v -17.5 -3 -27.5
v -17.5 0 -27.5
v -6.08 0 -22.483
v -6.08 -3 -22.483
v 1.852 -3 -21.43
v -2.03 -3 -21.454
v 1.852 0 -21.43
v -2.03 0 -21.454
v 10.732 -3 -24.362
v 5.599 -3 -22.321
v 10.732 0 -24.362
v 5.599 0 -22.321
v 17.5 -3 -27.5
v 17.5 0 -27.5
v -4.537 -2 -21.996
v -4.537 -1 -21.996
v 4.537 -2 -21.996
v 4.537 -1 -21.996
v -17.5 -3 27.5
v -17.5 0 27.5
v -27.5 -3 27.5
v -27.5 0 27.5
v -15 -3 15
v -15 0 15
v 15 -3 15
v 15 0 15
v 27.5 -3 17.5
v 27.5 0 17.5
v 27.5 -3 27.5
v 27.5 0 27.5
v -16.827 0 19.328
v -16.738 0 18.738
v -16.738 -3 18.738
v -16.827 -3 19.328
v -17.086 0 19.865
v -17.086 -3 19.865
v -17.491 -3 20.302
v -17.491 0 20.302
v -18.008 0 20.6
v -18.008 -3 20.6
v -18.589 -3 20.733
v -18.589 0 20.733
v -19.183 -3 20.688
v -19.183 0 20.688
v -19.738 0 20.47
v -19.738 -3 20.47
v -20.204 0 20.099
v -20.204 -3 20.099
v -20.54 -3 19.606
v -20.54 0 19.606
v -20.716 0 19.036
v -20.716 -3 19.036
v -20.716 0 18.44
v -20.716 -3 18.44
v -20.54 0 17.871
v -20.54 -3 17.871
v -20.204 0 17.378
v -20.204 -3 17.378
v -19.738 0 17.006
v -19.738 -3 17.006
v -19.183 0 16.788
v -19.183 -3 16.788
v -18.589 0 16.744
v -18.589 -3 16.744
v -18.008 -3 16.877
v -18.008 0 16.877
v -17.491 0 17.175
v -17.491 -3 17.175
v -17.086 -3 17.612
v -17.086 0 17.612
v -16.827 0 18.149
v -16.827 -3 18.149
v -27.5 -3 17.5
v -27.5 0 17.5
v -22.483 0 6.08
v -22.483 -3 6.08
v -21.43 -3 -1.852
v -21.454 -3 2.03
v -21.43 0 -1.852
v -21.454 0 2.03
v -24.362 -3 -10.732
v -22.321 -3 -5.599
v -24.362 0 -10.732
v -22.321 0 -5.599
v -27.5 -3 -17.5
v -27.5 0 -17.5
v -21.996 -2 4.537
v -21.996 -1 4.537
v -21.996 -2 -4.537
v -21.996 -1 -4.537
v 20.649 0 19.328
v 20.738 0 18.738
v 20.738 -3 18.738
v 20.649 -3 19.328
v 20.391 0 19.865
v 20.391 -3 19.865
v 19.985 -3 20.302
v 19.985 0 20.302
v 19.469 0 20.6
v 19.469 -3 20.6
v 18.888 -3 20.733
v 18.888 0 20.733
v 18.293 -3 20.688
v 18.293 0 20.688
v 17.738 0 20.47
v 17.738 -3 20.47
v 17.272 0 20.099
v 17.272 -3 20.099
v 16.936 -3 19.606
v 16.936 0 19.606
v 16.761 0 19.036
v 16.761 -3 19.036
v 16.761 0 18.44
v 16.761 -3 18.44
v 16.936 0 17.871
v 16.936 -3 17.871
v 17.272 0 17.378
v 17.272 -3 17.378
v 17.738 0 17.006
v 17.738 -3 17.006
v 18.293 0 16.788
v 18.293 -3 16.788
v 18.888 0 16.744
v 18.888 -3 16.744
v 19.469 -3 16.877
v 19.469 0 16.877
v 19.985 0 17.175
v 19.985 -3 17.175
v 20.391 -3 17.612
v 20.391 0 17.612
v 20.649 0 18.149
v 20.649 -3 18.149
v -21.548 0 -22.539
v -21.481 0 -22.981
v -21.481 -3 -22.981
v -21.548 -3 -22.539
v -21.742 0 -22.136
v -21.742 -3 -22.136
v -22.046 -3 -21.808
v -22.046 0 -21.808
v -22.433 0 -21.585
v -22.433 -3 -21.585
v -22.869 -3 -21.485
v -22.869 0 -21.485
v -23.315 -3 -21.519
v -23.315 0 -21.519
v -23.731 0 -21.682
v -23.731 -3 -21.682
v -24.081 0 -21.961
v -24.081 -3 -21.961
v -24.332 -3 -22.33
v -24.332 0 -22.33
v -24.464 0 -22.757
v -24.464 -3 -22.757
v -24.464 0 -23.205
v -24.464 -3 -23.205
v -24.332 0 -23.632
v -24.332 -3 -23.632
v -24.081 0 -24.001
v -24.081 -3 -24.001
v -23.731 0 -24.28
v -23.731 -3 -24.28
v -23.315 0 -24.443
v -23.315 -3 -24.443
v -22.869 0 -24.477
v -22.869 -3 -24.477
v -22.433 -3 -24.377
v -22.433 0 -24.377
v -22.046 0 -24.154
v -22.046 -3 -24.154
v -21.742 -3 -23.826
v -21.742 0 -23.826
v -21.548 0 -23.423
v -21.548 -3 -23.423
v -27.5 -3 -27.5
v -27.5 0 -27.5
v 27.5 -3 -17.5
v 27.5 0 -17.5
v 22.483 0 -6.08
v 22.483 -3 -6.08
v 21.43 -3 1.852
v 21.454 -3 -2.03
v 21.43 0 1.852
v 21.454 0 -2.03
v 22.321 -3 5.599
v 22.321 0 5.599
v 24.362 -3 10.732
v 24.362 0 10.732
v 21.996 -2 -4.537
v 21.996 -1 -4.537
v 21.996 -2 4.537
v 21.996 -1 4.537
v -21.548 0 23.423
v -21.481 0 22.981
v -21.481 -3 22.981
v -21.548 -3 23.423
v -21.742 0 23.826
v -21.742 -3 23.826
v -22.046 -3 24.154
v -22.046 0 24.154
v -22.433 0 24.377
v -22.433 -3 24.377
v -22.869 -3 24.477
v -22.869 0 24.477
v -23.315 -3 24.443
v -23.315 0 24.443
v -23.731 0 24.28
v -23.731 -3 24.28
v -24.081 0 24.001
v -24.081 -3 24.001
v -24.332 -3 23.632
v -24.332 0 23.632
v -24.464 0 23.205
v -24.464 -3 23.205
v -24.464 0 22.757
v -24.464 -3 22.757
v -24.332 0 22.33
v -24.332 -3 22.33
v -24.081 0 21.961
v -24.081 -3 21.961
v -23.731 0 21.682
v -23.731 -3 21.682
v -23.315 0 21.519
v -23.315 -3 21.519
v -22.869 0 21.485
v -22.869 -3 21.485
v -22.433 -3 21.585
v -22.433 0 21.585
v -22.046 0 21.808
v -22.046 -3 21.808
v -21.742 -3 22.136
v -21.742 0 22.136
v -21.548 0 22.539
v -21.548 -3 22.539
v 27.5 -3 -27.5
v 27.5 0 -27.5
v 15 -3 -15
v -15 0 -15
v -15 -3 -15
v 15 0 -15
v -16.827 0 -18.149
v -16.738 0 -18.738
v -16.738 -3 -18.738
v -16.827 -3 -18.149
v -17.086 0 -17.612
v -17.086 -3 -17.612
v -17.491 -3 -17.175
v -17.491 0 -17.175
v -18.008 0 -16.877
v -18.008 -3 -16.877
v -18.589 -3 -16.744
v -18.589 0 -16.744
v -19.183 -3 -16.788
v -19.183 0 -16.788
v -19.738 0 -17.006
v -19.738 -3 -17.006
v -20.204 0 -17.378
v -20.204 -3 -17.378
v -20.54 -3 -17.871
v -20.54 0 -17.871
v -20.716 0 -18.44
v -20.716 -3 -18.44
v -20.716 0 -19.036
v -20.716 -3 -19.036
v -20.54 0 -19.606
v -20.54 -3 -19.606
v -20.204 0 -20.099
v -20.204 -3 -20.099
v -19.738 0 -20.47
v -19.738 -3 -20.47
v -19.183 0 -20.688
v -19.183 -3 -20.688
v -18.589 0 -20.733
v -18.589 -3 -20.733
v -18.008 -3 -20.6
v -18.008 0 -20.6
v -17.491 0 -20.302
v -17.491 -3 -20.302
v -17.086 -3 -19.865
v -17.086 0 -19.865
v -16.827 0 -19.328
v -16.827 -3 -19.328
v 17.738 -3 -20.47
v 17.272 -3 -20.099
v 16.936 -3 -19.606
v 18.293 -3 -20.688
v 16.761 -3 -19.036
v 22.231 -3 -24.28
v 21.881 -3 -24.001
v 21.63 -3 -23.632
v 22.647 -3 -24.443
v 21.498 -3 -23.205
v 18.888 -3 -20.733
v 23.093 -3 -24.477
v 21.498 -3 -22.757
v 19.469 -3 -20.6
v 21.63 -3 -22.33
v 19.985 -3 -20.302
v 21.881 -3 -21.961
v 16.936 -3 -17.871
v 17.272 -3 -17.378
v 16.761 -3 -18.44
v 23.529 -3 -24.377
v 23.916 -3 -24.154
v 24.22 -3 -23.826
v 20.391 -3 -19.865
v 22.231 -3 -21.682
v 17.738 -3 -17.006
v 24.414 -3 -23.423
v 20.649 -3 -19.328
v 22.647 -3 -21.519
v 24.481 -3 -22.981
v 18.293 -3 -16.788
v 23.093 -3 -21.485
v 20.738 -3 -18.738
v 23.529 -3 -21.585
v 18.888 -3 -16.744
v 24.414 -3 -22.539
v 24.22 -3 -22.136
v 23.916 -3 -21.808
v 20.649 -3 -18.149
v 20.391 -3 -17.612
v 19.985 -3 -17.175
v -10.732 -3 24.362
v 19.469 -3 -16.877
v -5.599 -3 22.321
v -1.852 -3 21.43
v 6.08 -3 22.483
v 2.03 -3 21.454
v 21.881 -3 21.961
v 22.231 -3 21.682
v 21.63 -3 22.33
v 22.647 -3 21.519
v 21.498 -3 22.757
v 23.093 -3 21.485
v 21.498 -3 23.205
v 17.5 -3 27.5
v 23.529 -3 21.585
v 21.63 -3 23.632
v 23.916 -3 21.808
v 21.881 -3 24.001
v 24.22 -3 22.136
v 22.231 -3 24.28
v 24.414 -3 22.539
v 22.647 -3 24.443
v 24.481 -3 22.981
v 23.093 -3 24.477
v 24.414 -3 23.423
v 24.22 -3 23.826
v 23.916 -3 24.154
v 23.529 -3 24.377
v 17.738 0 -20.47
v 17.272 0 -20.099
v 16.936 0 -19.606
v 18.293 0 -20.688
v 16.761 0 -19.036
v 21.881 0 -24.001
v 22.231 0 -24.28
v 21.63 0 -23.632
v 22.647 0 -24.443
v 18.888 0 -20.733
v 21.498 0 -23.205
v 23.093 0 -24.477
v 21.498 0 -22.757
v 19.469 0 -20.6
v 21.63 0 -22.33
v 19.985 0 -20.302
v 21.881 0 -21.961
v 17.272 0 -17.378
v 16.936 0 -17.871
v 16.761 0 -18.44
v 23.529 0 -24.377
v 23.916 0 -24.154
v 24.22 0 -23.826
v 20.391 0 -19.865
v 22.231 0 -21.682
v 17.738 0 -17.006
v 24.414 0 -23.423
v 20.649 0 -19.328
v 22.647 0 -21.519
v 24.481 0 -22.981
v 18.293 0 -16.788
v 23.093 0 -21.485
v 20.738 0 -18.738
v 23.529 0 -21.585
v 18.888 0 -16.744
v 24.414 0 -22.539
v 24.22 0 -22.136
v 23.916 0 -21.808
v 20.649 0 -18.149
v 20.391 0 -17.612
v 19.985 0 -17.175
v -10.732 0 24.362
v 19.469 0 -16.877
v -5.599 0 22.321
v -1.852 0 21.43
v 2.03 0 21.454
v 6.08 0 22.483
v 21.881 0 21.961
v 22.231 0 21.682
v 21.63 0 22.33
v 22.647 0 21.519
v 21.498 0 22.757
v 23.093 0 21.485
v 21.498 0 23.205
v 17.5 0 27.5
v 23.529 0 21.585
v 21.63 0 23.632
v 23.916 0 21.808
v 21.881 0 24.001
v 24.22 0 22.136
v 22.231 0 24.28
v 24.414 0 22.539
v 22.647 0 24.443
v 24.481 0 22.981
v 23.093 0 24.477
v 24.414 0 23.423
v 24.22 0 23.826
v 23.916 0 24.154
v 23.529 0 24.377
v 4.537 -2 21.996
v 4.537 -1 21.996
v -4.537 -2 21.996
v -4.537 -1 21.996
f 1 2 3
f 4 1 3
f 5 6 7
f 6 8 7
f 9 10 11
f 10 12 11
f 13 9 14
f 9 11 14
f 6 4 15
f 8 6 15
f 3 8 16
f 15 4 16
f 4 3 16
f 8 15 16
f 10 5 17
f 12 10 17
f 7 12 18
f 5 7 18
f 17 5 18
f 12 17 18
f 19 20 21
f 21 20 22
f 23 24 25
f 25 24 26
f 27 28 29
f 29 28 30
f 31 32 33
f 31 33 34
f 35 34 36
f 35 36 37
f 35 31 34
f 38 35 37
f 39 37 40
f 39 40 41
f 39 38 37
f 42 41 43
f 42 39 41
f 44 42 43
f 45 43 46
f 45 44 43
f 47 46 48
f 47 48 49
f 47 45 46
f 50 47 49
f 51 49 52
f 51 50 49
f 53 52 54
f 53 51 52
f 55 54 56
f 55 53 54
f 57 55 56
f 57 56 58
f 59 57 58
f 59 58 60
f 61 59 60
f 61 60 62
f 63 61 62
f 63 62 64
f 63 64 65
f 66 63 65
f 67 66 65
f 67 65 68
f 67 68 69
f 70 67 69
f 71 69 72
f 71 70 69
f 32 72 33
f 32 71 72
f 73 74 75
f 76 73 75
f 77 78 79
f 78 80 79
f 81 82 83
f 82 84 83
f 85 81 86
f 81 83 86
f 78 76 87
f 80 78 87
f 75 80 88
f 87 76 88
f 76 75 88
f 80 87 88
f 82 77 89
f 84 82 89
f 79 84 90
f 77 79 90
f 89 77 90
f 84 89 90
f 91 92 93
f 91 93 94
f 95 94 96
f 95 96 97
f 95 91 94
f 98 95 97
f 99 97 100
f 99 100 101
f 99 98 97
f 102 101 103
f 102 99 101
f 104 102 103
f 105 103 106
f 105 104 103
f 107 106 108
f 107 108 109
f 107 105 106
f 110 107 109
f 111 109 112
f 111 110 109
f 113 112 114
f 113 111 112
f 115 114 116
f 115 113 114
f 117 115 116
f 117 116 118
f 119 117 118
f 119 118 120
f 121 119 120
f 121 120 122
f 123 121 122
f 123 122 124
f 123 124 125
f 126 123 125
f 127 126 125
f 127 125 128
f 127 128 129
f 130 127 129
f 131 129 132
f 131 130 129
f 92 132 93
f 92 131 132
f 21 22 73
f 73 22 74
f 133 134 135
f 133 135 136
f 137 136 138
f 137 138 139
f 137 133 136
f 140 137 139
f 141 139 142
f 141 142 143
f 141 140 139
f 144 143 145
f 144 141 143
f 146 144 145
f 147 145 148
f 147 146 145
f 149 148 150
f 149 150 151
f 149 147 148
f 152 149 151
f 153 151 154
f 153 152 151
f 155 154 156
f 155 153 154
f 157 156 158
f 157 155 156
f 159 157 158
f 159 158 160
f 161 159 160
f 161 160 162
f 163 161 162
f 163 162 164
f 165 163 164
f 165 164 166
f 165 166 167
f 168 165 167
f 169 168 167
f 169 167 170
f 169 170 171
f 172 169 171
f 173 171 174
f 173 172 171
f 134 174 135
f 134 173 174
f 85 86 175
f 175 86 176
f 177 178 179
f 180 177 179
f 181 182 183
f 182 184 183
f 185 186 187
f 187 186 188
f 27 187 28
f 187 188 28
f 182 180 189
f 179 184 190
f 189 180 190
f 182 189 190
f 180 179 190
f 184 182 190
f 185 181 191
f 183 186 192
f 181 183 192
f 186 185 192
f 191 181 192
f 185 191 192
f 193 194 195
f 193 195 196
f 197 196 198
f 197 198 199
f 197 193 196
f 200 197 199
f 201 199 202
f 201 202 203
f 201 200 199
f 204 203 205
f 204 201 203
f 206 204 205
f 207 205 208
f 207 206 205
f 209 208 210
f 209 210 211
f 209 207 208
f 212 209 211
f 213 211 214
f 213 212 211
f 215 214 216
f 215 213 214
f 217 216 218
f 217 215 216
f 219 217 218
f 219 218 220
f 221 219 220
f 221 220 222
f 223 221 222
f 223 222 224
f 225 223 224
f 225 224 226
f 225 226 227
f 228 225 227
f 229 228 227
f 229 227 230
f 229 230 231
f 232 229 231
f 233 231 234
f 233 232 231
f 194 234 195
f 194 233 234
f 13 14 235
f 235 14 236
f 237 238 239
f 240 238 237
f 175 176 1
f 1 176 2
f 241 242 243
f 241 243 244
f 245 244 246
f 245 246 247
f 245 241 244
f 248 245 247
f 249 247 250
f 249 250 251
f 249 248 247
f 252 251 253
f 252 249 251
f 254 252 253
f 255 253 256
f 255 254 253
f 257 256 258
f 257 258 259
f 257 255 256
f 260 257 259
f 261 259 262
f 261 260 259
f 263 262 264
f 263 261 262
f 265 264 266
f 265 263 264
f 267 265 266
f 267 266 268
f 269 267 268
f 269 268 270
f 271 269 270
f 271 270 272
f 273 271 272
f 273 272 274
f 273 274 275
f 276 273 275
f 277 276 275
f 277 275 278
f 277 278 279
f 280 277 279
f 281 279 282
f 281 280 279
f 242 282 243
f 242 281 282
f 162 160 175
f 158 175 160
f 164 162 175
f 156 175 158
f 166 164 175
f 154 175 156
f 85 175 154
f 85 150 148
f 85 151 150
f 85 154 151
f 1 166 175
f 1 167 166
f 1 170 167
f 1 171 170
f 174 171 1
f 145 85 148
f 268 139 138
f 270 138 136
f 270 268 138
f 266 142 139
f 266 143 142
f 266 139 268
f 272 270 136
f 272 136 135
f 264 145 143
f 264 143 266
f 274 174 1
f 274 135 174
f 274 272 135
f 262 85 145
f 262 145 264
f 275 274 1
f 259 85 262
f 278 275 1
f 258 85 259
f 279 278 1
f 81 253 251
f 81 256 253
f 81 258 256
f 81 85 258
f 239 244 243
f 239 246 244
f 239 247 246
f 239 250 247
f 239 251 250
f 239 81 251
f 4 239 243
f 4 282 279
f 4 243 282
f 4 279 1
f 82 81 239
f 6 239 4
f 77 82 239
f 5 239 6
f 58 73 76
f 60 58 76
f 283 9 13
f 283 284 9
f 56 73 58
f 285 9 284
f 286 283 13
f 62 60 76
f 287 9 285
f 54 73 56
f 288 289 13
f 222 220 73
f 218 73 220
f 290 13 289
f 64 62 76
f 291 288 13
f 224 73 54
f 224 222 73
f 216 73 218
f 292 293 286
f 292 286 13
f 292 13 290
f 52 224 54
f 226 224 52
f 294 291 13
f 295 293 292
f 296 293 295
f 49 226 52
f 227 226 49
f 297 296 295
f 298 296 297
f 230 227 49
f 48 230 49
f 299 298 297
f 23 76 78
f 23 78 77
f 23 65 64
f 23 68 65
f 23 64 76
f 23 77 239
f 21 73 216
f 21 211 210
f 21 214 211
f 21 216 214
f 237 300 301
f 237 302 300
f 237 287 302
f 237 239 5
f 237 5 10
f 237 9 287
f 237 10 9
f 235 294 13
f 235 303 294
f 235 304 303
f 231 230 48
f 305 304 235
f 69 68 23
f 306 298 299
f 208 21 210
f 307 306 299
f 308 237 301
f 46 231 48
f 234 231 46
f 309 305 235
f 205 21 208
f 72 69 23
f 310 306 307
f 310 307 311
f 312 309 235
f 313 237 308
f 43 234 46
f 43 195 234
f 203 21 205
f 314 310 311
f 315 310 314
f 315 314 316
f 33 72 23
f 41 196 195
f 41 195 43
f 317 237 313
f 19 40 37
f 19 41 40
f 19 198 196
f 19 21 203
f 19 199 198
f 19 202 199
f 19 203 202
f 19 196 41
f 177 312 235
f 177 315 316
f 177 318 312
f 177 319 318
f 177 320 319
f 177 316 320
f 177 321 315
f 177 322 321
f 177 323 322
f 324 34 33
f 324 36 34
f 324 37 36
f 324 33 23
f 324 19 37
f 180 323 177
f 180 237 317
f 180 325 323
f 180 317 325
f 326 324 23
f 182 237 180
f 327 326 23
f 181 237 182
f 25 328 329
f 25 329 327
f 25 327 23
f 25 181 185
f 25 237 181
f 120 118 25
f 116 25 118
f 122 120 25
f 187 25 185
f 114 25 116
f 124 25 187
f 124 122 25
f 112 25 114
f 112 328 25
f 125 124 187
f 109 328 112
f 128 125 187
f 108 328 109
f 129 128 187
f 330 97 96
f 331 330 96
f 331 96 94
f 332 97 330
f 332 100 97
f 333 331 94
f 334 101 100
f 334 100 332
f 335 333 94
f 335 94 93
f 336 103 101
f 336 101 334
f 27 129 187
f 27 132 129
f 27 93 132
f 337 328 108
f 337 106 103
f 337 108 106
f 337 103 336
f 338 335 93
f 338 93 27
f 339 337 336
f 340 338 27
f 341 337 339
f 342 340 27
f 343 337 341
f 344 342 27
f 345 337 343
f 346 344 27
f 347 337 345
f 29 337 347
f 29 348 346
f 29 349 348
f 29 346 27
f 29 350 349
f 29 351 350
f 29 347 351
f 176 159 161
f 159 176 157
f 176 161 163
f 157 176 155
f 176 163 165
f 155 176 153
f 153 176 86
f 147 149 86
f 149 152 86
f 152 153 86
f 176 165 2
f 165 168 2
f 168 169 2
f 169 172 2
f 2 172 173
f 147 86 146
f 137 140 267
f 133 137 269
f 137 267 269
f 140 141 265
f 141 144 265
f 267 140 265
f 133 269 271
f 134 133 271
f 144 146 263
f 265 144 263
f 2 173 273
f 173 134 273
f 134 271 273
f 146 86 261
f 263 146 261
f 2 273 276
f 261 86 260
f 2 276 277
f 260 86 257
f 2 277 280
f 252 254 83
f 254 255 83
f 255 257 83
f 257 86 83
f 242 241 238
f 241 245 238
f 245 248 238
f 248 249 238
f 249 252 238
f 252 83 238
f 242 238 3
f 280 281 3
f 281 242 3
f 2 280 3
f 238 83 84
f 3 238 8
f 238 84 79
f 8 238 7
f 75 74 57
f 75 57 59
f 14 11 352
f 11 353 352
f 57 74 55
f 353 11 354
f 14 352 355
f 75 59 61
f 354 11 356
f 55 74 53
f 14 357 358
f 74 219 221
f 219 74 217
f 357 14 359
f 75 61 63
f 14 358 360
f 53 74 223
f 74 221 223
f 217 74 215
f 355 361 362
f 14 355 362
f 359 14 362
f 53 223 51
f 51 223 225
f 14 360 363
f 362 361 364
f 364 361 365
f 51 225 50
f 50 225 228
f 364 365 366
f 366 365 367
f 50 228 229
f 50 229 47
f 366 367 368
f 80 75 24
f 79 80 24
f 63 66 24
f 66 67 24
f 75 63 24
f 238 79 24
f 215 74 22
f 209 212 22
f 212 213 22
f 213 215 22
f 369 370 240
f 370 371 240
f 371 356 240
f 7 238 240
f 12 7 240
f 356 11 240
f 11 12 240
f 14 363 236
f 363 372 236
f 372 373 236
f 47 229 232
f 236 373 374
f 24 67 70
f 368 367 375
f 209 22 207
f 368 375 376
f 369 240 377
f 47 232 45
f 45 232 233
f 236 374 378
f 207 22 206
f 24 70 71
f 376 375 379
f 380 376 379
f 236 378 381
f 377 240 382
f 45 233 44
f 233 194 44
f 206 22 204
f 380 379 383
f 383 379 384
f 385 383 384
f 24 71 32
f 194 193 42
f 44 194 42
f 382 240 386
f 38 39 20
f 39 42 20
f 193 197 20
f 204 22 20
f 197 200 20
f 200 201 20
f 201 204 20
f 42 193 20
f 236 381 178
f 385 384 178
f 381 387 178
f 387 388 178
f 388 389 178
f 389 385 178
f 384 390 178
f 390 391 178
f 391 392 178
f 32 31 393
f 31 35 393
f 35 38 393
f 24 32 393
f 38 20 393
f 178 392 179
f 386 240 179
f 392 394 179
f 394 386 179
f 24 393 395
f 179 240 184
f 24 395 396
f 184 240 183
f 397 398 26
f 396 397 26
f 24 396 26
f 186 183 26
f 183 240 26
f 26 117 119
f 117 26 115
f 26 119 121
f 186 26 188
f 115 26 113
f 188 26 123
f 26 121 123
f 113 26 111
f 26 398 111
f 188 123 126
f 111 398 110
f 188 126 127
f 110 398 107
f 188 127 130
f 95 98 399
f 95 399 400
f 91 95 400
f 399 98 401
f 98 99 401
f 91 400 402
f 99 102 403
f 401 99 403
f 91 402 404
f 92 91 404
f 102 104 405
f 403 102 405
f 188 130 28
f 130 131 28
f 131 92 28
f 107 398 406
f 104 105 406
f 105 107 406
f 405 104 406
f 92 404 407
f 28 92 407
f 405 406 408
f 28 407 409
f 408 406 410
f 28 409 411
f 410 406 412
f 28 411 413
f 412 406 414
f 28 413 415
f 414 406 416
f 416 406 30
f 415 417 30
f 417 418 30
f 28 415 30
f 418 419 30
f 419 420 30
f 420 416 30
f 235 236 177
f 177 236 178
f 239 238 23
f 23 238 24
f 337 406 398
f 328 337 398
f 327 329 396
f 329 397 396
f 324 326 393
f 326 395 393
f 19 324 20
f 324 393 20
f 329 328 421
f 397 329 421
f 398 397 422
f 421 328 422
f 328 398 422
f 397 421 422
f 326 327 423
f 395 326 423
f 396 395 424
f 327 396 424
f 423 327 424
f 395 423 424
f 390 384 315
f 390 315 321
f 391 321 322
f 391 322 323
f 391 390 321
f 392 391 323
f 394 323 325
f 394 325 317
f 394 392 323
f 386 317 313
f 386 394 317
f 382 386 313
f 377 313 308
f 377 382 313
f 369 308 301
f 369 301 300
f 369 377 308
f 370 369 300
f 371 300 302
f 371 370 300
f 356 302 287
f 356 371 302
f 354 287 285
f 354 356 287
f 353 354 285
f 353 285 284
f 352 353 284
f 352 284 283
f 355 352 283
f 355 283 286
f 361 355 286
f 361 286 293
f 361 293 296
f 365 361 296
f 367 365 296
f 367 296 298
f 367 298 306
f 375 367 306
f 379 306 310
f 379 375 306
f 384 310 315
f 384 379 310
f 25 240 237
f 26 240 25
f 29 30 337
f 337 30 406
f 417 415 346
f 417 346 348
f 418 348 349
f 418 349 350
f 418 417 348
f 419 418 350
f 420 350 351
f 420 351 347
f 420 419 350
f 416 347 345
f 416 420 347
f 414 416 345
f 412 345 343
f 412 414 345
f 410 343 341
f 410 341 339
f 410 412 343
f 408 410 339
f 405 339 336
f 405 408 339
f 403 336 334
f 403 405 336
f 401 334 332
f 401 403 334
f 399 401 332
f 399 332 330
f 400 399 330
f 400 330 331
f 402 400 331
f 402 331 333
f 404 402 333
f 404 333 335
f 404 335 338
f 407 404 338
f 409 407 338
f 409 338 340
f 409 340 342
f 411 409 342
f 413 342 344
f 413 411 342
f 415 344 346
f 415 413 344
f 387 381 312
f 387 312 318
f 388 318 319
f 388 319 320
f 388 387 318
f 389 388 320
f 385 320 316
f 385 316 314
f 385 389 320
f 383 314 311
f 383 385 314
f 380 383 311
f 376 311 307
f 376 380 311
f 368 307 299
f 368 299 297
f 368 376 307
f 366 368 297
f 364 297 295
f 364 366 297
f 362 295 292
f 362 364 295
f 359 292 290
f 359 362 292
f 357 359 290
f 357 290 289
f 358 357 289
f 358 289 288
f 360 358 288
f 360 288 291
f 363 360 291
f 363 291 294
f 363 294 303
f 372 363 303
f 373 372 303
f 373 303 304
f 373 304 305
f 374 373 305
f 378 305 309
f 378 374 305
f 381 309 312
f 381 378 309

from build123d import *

# Parameters (mm, degrees)
F0_R     = 1.5
F0_R_2   = 2
F0_W     = 30
F0_H     = 30
F1_DEPTH = 3


# Not quite as in the source:
# - ends of sketch curves that miss each other by under 0.0002 mm in the source are joined


with BuildPart() as f1:
    # F0 (on Front) → F1 (new body)
    with BuildSketch(Plane.XZ):
        with BuildLine():
            Line((27.5, 17.5), (27.5, 27.5))
            Line((27.5, 27.5), (17.5, 27.5))
            add(Edge.make_bspline(
                [(17.5, 27.5), (0, 19.2440692335), (0, 19.2440692335), (-17.5, 27.5)],
                knots=[0, 0, 0, 0, 35, 35, 35, 35], degree=3))
            Line((-17.5, 27.5), (-27.5, 27.5))
            Line((-27.5, 27.5), (-27.5, 17.5))
            add(Edge.make_bspline(
                [(-27.5, 17.5), (-19.2440692335, 0), (-19.2440692335, 0), (-27.5, -17.5)],
                knots=[0, 0, 0, 0, 35, 35, 35, 35], degree=3))
            Line((-27.5, -17.5), (-27.5, -27.5))
            Line((-27.5, -27.5), (-17.5, -27.5))
            add(Edge.make_bspline(
                [(-17.5, -27.5), (0, -19.2440692335), (0, -19.2440692335), (17.5, -27.5)],
                knots=[0, 0, 0, 0, 35, 35, 35, 35], degree=3))
            Line((17.5, -27.5), (27.5, -27.5))
            Line((27.5, -27.5), (27.5, -17.5))
            add(Edge.make_bspline(
                [(27.5, -17.5), (19.2440690845, 0), (19.2440692335, 0), (27.5, 17.5)],
                knots=[0, 0, 0, 0, 35, 35, 35, 35], degree=3))
        make_face()
        with Locations((-22.9809703886, -22.9809703886)):
            Circle(F0_R, mode=Mode.SUBTRACT)
        with Locations((-18.7383297014, -18.7383297014)):
            Circle(F0_R_2, mode=Mode.SUBTRACT)
        with Locations((22.9809703886, -22.9809703886)):
            Circle(F0_R, mode=Mode.SUBTRACT)
        with Locations((18.7383297014, -18.7383297014)):
            Circle(F0_R_2, mode=Mode.SUBTRACT)
        with Locations((-18.7383297014, 18.7383297014)):
            Circle(F0_R_2, mode=Mode.SUBTRACT)
        with Locations((-22.9809703886, 22.9809703886)):
            Circle(F0_R, mode=Mode.SUBTRACT)
        Rectangle(F0_W, F0_H, mode=Mode.SUBTRACT)
        with Locations((18.7383297014, 18.7383297014)):
            Circle(F0_R_2, mode=Mode.SUBTRACT)
        with Locations((22.9809703886, 22.9809703886)):
            Circle(F0_R, mode=Mode.SUBTRACT)
    extrude(amount=F1_DEPTH)


solid = f1.part
